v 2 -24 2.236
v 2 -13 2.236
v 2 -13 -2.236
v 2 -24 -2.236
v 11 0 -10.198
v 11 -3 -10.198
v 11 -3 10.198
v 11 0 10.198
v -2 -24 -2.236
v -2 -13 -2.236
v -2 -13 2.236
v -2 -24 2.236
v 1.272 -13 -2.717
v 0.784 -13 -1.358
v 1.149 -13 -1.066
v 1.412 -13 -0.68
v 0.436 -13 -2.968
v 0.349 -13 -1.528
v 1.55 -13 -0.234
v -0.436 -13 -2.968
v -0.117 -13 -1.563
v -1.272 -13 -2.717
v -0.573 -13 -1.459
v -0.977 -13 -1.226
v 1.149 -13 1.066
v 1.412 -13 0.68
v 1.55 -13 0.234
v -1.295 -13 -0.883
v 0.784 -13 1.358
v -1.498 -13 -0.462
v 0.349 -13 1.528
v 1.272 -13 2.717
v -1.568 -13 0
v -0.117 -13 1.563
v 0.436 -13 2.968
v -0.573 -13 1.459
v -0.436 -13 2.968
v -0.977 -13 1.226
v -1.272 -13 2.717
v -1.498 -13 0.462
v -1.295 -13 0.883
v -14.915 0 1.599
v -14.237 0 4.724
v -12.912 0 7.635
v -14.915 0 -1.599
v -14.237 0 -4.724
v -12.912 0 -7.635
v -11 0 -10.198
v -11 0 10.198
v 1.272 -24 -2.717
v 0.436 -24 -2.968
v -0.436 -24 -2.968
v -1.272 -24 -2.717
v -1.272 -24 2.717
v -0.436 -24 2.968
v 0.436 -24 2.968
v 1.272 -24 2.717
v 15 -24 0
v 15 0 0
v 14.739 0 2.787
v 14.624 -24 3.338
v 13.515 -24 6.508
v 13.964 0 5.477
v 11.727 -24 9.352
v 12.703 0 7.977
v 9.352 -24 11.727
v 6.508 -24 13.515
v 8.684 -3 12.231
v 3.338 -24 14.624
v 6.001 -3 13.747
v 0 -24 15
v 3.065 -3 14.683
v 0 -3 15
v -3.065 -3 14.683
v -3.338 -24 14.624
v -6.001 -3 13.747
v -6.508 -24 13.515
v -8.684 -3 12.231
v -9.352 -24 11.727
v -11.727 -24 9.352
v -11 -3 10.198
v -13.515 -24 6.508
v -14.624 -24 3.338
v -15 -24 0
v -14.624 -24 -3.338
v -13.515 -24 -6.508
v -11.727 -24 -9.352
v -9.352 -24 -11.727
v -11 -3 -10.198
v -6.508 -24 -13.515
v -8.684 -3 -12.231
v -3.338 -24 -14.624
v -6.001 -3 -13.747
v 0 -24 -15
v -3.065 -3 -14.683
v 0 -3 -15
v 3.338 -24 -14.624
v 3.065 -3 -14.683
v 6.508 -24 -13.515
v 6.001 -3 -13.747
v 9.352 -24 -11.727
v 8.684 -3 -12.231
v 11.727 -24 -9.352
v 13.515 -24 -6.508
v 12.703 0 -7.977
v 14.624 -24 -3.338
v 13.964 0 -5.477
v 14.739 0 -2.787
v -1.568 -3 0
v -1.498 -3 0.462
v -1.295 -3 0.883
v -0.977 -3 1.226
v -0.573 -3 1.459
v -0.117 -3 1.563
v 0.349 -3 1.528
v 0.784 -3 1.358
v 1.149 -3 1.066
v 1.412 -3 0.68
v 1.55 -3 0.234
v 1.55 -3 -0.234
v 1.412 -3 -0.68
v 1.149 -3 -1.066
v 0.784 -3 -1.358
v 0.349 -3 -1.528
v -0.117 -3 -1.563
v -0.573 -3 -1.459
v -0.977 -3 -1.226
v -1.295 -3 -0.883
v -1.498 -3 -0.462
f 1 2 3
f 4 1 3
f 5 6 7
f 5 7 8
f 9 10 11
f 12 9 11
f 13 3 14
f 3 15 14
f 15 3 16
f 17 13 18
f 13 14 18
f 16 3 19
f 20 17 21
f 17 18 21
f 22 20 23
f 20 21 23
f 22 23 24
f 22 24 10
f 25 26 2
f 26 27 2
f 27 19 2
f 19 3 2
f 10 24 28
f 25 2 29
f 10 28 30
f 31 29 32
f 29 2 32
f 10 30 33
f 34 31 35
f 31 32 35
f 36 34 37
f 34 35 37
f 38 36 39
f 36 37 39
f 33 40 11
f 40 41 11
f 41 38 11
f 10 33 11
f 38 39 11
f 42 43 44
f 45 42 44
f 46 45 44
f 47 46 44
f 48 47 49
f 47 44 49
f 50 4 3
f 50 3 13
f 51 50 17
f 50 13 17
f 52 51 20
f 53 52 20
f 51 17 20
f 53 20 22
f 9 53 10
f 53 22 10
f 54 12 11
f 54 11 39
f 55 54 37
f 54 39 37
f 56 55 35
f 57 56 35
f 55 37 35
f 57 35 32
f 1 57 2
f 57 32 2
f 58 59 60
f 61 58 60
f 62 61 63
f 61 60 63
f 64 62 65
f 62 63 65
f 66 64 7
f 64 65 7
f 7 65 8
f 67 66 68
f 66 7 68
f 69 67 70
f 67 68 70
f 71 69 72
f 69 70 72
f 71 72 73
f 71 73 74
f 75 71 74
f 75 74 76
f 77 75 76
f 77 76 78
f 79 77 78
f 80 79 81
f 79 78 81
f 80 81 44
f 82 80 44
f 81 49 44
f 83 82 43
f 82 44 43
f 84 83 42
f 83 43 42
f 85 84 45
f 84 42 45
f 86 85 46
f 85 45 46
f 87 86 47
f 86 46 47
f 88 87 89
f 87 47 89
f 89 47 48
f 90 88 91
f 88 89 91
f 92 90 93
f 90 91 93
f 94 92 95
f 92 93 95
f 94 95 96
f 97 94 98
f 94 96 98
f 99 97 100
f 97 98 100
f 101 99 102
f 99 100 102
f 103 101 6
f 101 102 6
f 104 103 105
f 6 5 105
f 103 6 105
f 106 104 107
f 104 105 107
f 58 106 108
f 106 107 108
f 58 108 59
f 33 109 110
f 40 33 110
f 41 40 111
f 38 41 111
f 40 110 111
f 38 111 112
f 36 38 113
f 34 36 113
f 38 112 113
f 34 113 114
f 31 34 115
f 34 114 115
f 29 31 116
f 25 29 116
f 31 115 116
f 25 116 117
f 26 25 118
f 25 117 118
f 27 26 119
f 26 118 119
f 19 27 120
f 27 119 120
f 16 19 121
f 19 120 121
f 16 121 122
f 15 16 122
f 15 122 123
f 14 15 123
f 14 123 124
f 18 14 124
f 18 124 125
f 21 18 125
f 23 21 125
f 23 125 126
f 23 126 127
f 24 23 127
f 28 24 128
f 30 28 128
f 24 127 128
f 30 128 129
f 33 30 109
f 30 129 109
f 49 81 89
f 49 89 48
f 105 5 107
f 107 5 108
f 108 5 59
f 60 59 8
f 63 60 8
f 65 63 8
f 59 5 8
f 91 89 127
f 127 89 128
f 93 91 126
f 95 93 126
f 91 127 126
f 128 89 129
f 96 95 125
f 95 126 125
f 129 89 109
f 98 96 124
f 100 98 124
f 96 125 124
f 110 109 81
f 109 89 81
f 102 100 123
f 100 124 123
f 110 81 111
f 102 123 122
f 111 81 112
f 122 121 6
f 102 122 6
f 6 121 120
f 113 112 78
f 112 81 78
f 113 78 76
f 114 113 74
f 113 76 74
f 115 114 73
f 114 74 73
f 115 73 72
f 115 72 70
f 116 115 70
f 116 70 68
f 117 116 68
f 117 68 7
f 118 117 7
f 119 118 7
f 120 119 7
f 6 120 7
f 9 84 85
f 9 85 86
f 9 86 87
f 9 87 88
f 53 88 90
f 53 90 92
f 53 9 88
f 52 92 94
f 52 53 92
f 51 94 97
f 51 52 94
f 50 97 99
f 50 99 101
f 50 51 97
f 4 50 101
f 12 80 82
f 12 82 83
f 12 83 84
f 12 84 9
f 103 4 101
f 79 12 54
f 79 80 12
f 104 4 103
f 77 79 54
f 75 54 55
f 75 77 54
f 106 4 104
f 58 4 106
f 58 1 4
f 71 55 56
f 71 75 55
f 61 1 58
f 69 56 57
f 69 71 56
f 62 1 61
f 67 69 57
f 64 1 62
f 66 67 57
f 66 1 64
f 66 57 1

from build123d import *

# Parameters (mm, degrees)
F0_R     = 15
F1_DEPTH = 24
F2_W     = 11
F2_H     = 3
F3_DEPTH = 15
F5_R     = 3.056512
F5_R_2   = 1.567652
F6_DEPTH = 10


with BuildPart() as f1:
    # F0 (on Front) → F1 (new body)
    with BuildSketch(Plane.XZ):
        Circle(F0_R)
        with BuildLine():
            ThreePointArc((2, -2.236068), (0, -3), (-2, -2.236068))
            Line((-2, -2.236068), (-2, 2.236068))
            ThreePointArc((-2, 2.236068), (0, 3), (2, 2.236068))
            Line((2, 2.236068), (2, -2.236068))
        make_face(mode=Mode.SUBTRACT)
    extrude(amount=F1_DEPTH)

    # F2 (on Top) → F3 (cut, symmetric)
    with BuildSketch(Plane.XY):
        with Locations((-5.5, -1.5)):
            Rectangle(F2_W, F2_H)
        with Locations((5.5, -1.5)):
            Rectangle(F2_W, F2_H)
    extrude(amount=F3_DEPTH, both=True, mode=Mode.SUBTRACT)

    # F5 (on offset) → F6 (join)
    with BuildSketch(Plane(origin=(0, -3, 0), x_dir=(-1, 0, 0), z_dir=(0, 1, 0))):
        Circle(F5_R)
        Circle(F5_R_2, mode=Mode.SUBTRACT)
    extrude(amount=-F6_DEPTH)


solid = f1.part
